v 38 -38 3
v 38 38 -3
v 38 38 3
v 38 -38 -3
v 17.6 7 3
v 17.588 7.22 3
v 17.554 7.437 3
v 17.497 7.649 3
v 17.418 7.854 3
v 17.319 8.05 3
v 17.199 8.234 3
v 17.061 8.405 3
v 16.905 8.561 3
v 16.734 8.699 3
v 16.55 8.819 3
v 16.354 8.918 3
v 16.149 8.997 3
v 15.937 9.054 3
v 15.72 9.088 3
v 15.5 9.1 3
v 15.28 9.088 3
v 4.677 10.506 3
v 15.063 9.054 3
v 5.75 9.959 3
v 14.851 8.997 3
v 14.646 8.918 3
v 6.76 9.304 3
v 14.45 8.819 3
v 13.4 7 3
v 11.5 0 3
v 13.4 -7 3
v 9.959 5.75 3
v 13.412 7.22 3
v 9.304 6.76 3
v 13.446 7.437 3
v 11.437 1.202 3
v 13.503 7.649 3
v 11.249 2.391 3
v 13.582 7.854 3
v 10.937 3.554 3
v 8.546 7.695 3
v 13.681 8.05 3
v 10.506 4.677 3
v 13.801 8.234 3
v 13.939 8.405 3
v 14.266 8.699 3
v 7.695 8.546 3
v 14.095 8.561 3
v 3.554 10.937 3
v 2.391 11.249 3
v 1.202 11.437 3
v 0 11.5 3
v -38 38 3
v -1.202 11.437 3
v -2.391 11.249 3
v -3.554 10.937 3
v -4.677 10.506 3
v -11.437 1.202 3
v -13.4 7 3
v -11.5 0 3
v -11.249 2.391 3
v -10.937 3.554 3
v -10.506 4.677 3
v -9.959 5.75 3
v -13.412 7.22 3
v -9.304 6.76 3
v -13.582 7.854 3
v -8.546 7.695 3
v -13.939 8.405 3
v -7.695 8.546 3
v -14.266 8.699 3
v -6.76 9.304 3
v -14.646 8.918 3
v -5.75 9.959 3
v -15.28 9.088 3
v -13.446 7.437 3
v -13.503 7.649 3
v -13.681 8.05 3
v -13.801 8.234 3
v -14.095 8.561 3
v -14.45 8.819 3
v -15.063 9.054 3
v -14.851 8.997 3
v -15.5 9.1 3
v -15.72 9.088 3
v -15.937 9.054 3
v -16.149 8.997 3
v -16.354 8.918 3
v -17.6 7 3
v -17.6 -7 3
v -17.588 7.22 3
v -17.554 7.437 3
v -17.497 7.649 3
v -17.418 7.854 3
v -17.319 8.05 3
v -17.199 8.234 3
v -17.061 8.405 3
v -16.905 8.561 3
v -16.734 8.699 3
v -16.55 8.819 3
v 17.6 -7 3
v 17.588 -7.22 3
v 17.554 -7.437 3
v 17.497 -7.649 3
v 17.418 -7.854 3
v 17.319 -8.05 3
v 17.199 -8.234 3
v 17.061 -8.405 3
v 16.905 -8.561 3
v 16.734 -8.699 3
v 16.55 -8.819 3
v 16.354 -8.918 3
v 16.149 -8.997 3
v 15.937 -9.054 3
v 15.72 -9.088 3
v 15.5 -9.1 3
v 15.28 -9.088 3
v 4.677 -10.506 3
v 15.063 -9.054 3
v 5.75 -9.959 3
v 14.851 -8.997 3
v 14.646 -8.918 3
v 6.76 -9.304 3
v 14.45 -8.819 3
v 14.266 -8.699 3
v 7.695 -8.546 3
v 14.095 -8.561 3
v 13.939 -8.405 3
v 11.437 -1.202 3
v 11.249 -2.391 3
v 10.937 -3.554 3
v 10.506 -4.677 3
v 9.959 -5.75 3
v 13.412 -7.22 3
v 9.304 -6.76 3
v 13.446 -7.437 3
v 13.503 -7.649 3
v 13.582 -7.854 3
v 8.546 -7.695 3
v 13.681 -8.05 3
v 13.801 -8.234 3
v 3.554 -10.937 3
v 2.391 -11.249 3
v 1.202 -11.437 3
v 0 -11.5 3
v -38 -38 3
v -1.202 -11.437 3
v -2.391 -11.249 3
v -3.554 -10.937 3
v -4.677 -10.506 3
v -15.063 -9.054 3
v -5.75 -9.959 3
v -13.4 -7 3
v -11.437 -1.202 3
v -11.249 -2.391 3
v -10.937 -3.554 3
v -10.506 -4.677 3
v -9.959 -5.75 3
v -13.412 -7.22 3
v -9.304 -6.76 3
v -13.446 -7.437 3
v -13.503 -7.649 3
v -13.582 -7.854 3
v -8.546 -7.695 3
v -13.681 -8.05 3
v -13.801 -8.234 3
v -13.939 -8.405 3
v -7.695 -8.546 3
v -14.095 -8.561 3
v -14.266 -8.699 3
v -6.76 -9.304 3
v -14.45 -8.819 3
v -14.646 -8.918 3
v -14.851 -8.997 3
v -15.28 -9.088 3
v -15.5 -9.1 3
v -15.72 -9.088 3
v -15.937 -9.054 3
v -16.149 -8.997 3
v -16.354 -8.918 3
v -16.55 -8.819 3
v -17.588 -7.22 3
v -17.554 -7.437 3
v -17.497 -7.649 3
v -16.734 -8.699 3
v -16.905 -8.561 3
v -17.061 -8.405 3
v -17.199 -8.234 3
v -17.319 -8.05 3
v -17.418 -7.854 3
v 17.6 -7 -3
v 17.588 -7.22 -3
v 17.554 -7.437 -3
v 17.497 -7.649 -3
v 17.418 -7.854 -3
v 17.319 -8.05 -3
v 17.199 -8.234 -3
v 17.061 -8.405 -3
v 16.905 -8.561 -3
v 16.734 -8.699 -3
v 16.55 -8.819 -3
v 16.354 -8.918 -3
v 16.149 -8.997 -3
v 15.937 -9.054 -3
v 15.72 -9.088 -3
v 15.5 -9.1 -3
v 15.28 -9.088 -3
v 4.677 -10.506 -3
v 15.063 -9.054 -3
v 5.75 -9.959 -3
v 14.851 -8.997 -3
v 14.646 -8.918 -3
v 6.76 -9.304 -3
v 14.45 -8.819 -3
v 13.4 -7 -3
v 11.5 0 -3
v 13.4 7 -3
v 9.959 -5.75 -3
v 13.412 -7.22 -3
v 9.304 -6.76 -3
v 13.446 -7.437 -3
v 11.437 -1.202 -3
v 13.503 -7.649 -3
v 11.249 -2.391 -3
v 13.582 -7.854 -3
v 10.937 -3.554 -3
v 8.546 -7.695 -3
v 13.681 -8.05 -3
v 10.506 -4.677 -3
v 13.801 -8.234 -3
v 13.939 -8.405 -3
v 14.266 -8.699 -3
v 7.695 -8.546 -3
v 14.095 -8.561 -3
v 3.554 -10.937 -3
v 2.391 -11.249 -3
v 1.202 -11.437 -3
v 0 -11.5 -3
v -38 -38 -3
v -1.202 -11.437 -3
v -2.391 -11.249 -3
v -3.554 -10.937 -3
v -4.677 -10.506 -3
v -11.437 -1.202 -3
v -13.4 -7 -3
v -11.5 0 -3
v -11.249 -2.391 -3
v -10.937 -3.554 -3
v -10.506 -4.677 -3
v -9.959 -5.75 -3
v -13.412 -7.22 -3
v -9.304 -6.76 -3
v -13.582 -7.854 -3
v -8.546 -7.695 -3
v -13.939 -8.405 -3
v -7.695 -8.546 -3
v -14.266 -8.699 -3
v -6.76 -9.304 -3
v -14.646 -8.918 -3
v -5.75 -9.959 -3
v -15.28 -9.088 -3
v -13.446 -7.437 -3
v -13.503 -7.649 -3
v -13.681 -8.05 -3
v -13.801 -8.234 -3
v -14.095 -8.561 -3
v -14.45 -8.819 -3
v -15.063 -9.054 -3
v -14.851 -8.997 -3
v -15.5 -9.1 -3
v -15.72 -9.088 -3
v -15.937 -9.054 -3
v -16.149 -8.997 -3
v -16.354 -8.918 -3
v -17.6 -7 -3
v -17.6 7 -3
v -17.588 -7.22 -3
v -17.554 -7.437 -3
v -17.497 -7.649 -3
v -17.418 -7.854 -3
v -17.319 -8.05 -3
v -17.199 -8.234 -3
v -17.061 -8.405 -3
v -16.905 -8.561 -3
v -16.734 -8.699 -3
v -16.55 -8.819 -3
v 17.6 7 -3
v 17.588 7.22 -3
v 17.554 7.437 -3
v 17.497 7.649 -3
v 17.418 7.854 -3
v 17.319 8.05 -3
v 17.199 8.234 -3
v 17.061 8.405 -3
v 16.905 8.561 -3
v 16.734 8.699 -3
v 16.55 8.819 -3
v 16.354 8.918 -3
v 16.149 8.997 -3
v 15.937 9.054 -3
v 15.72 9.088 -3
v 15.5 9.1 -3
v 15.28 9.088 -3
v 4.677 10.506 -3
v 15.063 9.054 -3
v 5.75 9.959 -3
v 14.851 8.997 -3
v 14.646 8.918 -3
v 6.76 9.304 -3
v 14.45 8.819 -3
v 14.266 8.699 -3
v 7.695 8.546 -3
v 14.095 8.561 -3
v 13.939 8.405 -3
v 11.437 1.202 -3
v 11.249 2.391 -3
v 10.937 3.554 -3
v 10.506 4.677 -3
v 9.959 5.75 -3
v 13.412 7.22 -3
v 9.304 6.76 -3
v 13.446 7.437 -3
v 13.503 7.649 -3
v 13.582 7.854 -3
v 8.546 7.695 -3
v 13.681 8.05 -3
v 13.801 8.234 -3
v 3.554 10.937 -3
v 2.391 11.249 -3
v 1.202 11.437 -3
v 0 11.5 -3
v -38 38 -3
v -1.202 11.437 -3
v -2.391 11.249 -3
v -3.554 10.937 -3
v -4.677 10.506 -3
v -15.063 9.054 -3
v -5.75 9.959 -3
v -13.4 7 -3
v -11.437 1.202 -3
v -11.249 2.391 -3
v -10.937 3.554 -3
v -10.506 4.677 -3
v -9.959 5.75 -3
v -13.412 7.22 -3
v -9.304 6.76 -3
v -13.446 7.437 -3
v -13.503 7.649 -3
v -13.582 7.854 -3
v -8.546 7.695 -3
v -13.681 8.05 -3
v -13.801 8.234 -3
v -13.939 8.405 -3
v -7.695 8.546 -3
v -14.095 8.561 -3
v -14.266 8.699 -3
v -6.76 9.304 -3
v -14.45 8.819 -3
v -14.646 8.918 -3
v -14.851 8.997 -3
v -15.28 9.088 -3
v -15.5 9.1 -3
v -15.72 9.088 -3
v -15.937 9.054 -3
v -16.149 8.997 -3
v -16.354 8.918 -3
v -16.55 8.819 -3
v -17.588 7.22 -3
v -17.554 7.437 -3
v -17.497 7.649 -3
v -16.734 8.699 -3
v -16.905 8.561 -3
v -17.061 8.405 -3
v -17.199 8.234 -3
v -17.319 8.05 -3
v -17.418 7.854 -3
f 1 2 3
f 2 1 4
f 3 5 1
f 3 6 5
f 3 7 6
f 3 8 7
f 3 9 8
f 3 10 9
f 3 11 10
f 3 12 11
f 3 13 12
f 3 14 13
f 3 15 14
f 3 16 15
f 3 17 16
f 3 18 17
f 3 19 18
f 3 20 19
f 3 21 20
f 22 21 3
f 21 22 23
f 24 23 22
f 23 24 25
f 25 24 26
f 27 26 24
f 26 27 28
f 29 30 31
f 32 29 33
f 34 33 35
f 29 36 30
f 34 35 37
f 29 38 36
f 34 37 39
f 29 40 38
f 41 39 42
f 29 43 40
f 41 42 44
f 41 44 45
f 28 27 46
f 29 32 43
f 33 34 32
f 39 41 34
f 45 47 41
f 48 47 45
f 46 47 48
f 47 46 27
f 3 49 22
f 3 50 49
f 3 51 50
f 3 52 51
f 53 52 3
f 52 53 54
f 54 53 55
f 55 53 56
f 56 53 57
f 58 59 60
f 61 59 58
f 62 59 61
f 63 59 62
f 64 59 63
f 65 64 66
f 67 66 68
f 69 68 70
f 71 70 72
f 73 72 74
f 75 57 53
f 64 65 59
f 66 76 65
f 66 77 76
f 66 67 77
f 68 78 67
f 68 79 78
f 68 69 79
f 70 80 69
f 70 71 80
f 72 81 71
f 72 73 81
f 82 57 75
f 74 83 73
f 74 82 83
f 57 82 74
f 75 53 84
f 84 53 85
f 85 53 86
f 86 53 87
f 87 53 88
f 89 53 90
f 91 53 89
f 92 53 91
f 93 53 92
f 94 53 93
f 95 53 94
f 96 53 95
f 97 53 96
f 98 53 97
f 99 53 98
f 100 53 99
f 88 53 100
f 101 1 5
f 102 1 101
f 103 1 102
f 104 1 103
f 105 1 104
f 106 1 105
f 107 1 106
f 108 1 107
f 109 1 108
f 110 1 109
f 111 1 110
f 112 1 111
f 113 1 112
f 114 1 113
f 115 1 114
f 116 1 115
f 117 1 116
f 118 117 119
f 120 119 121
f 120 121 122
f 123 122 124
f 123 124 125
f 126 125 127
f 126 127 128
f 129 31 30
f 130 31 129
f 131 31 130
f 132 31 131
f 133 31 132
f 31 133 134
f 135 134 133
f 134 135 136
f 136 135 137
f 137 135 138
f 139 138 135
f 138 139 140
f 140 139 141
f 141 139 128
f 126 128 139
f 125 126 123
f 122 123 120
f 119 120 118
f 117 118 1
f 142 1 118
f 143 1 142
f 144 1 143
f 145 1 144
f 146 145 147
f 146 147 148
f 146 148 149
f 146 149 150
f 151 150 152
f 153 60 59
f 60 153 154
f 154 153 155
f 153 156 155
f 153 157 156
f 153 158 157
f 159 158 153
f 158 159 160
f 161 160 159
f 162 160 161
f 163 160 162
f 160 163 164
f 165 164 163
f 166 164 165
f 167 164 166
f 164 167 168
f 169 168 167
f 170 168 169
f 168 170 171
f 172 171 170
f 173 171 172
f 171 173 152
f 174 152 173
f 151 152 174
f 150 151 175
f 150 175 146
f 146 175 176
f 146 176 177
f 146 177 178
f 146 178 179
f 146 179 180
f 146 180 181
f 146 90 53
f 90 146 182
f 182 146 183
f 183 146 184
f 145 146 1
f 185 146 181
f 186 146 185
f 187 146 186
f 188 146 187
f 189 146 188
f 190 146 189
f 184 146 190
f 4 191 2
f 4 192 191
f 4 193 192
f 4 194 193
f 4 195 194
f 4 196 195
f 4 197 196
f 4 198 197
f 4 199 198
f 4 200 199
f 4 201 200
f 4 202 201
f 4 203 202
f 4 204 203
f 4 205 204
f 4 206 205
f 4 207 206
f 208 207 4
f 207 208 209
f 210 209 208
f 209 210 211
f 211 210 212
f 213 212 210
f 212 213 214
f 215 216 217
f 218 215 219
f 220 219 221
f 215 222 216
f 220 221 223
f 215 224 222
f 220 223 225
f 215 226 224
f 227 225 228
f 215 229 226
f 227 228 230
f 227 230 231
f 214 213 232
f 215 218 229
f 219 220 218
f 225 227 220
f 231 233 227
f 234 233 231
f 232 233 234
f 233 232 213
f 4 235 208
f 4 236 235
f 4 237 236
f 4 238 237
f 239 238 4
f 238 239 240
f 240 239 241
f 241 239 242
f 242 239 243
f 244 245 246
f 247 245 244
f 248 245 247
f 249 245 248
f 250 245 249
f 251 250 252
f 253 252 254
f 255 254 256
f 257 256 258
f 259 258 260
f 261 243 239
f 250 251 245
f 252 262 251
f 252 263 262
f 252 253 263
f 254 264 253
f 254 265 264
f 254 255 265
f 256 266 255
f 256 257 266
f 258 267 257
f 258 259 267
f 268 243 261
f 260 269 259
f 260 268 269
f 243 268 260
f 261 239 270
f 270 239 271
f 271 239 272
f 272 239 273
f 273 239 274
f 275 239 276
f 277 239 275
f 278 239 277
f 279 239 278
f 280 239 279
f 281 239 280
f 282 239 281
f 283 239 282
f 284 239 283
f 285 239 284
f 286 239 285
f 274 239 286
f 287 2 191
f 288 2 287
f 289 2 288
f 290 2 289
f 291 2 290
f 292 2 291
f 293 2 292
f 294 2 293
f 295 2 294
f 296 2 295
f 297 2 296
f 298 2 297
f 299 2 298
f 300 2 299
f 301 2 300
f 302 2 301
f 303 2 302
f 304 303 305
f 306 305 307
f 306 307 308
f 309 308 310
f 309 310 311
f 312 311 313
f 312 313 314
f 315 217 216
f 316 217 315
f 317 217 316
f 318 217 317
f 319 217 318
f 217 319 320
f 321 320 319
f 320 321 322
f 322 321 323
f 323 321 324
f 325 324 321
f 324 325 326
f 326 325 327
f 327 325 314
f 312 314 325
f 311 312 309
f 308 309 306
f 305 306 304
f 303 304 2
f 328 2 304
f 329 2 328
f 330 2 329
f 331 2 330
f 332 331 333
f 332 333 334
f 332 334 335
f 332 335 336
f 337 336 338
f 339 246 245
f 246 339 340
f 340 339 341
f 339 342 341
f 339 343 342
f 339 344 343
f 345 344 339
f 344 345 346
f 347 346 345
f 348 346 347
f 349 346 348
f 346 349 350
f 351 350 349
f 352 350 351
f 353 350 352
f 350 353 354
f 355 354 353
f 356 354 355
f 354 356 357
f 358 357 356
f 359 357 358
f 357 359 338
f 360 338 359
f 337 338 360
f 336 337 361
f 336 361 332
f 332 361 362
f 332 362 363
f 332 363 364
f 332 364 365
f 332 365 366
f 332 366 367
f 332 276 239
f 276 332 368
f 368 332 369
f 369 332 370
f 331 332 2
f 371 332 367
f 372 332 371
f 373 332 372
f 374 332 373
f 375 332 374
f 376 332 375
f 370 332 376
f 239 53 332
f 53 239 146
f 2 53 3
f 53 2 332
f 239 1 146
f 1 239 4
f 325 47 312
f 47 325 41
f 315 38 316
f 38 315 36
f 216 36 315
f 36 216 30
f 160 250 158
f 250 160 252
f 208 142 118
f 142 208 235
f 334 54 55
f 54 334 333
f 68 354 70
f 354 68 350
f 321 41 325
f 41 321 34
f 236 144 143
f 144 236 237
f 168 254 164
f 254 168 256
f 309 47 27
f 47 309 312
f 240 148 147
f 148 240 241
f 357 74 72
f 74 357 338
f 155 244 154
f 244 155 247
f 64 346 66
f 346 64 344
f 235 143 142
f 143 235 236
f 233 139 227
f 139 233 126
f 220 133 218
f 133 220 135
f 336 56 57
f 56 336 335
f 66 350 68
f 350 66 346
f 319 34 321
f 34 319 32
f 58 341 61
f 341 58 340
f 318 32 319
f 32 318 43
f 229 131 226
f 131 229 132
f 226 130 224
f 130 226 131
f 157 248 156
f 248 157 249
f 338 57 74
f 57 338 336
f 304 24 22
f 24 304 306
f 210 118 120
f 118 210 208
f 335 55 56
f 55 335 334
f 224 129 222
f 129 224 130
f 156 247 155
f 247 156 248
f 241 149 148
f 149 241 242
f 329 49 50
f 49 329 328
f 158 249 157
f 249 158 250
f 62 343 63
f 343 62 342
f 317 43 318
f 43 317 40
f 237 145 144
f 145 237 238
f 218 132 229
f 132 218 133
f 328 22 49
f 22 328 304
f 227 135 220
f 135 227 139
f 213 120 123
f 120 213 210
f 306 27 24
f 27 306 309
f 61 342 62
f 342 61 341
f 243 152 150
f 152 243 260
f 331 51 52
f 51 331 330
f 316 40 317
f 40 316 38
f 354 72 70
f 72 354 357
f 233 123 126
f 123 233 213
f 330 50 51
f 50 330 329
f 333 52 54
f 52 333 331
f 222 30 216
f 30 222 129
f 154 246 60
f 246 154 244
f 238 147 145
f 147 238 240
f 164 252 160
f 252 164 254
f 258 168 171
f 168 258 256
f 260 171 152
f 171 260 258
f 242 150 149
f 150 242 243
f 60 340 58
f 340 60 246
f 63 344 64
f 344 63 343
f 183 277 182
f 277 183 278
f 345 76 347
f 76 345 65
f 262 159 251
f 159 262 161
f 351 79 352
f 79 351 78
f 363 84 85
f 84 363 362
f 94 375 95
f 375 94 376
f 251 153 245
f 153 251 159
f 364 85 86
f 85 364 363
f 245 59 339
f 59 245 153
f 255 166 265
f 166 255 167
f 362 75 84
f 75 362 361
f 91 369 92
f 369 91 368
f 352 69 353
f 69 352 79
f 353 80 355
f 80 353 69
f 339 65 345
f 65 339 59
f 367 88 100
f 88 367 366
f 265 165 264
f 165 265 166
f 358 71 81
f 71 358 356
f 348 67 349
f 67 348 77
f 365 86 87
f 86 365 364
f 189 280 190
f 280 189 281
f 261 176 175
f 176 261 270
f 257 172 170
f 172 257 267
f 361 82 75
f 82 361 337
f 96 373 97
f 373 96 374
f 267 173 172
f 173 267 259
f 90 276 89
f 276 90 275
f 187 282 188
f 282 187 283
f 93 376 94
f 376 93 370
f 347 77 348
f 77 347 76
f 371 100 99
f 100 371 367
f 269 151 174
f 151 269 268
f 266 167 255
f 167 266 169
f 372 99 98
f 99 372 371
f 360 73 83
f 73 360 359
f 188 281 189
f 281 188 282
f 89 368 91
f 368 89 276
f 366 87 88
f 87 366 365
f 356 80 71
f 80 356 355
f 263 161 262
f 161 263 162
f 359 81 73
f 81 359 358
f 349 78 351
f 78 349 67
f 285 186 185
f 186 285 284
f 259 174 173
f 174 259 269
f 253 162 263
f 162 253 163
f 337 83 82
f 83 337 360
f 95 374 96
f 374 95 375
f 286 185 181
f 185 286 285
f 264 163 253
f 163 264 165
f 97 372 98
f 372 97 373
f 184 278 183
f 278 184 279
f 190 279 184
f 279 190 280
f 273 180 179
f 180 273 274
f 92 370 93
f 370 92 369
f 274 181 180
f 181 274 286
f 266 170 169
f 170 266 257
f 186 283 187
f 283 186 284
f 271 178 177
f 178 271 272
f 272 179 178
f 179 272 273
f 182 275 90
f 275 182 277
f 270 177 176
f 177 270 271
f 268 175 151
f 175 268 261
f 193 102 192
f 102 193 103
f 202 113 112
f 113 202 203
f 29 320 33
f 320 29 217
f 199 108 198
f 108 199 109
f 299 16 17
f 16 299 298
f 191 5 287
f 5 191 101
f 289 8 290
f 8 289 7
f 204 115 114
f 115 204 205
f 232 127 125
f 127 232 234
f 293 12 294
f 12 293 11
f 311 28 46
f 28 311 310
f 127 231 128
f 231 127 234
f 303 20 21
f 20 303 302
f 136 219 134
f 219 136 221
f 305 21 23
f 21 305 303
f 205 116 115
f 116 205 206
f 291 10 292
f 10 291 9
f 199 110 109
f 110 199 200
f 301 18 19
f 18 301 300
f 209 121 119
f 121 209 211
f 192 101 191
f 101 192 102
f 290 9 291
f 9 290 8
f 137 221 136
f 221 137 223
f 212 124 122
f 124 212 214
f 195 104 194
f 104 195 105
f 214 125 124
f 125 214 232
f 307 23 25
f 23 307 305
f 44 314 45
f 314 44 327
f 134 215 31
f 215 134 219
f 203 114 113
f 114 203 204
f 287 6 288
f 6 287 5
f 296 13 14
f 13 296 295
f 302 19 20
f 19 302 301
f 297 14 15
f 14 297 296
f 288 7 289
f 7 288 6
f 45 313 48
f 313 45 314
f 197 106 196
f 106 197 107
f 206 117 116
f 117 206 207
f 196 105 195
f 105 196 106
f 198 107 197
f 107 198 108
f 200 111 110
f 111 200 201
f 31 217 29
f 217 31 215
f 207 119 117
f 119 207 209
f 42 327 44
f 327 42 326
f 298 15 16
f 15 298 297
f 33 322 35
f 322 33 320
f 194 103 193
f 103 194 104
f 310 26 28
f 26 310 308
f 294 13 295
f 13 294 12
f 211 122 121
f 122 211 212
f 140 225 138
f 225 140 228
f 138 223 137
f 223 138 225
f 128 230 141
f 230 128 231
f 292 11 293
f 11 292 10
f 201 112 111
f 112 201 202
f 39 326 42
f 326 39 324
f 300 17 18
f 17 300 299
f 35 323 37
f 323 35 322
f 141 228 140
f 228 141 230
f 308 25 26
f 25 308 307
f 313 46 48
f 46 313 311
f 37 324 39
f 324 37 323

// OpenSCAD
// NEMA 17 adjustable motor plate, 76 mm square.
$fn = 60;
eps = 0.02;
plate = 76;
plate_t = 6;
hole_pitch = 31;
center_d = 23;
slot_l = 14;
slot_d = 4.2;
module slot(x) {
    hull() {
        translate([x, -slot_l / 2, -plate_t / 2 - eps]) cylinder(d = slot_d, h = plate_t + 2 * eps);
        translate([x, slot_l / 2, -plate_t / 2 - eps]) cylinder(d = slot_d, h = plate_t + 2 * eps);
    }
}
difference() {
    cube([plate, plate, plate_t], center = true);
    translate([0, 0, -plate_t / 2 - eps]) cylinder(d = center_d, h = plate_t + 2 * eps);
    slot(-hole_pitch / 2);
    slot(hole_pitch / 2);
}
